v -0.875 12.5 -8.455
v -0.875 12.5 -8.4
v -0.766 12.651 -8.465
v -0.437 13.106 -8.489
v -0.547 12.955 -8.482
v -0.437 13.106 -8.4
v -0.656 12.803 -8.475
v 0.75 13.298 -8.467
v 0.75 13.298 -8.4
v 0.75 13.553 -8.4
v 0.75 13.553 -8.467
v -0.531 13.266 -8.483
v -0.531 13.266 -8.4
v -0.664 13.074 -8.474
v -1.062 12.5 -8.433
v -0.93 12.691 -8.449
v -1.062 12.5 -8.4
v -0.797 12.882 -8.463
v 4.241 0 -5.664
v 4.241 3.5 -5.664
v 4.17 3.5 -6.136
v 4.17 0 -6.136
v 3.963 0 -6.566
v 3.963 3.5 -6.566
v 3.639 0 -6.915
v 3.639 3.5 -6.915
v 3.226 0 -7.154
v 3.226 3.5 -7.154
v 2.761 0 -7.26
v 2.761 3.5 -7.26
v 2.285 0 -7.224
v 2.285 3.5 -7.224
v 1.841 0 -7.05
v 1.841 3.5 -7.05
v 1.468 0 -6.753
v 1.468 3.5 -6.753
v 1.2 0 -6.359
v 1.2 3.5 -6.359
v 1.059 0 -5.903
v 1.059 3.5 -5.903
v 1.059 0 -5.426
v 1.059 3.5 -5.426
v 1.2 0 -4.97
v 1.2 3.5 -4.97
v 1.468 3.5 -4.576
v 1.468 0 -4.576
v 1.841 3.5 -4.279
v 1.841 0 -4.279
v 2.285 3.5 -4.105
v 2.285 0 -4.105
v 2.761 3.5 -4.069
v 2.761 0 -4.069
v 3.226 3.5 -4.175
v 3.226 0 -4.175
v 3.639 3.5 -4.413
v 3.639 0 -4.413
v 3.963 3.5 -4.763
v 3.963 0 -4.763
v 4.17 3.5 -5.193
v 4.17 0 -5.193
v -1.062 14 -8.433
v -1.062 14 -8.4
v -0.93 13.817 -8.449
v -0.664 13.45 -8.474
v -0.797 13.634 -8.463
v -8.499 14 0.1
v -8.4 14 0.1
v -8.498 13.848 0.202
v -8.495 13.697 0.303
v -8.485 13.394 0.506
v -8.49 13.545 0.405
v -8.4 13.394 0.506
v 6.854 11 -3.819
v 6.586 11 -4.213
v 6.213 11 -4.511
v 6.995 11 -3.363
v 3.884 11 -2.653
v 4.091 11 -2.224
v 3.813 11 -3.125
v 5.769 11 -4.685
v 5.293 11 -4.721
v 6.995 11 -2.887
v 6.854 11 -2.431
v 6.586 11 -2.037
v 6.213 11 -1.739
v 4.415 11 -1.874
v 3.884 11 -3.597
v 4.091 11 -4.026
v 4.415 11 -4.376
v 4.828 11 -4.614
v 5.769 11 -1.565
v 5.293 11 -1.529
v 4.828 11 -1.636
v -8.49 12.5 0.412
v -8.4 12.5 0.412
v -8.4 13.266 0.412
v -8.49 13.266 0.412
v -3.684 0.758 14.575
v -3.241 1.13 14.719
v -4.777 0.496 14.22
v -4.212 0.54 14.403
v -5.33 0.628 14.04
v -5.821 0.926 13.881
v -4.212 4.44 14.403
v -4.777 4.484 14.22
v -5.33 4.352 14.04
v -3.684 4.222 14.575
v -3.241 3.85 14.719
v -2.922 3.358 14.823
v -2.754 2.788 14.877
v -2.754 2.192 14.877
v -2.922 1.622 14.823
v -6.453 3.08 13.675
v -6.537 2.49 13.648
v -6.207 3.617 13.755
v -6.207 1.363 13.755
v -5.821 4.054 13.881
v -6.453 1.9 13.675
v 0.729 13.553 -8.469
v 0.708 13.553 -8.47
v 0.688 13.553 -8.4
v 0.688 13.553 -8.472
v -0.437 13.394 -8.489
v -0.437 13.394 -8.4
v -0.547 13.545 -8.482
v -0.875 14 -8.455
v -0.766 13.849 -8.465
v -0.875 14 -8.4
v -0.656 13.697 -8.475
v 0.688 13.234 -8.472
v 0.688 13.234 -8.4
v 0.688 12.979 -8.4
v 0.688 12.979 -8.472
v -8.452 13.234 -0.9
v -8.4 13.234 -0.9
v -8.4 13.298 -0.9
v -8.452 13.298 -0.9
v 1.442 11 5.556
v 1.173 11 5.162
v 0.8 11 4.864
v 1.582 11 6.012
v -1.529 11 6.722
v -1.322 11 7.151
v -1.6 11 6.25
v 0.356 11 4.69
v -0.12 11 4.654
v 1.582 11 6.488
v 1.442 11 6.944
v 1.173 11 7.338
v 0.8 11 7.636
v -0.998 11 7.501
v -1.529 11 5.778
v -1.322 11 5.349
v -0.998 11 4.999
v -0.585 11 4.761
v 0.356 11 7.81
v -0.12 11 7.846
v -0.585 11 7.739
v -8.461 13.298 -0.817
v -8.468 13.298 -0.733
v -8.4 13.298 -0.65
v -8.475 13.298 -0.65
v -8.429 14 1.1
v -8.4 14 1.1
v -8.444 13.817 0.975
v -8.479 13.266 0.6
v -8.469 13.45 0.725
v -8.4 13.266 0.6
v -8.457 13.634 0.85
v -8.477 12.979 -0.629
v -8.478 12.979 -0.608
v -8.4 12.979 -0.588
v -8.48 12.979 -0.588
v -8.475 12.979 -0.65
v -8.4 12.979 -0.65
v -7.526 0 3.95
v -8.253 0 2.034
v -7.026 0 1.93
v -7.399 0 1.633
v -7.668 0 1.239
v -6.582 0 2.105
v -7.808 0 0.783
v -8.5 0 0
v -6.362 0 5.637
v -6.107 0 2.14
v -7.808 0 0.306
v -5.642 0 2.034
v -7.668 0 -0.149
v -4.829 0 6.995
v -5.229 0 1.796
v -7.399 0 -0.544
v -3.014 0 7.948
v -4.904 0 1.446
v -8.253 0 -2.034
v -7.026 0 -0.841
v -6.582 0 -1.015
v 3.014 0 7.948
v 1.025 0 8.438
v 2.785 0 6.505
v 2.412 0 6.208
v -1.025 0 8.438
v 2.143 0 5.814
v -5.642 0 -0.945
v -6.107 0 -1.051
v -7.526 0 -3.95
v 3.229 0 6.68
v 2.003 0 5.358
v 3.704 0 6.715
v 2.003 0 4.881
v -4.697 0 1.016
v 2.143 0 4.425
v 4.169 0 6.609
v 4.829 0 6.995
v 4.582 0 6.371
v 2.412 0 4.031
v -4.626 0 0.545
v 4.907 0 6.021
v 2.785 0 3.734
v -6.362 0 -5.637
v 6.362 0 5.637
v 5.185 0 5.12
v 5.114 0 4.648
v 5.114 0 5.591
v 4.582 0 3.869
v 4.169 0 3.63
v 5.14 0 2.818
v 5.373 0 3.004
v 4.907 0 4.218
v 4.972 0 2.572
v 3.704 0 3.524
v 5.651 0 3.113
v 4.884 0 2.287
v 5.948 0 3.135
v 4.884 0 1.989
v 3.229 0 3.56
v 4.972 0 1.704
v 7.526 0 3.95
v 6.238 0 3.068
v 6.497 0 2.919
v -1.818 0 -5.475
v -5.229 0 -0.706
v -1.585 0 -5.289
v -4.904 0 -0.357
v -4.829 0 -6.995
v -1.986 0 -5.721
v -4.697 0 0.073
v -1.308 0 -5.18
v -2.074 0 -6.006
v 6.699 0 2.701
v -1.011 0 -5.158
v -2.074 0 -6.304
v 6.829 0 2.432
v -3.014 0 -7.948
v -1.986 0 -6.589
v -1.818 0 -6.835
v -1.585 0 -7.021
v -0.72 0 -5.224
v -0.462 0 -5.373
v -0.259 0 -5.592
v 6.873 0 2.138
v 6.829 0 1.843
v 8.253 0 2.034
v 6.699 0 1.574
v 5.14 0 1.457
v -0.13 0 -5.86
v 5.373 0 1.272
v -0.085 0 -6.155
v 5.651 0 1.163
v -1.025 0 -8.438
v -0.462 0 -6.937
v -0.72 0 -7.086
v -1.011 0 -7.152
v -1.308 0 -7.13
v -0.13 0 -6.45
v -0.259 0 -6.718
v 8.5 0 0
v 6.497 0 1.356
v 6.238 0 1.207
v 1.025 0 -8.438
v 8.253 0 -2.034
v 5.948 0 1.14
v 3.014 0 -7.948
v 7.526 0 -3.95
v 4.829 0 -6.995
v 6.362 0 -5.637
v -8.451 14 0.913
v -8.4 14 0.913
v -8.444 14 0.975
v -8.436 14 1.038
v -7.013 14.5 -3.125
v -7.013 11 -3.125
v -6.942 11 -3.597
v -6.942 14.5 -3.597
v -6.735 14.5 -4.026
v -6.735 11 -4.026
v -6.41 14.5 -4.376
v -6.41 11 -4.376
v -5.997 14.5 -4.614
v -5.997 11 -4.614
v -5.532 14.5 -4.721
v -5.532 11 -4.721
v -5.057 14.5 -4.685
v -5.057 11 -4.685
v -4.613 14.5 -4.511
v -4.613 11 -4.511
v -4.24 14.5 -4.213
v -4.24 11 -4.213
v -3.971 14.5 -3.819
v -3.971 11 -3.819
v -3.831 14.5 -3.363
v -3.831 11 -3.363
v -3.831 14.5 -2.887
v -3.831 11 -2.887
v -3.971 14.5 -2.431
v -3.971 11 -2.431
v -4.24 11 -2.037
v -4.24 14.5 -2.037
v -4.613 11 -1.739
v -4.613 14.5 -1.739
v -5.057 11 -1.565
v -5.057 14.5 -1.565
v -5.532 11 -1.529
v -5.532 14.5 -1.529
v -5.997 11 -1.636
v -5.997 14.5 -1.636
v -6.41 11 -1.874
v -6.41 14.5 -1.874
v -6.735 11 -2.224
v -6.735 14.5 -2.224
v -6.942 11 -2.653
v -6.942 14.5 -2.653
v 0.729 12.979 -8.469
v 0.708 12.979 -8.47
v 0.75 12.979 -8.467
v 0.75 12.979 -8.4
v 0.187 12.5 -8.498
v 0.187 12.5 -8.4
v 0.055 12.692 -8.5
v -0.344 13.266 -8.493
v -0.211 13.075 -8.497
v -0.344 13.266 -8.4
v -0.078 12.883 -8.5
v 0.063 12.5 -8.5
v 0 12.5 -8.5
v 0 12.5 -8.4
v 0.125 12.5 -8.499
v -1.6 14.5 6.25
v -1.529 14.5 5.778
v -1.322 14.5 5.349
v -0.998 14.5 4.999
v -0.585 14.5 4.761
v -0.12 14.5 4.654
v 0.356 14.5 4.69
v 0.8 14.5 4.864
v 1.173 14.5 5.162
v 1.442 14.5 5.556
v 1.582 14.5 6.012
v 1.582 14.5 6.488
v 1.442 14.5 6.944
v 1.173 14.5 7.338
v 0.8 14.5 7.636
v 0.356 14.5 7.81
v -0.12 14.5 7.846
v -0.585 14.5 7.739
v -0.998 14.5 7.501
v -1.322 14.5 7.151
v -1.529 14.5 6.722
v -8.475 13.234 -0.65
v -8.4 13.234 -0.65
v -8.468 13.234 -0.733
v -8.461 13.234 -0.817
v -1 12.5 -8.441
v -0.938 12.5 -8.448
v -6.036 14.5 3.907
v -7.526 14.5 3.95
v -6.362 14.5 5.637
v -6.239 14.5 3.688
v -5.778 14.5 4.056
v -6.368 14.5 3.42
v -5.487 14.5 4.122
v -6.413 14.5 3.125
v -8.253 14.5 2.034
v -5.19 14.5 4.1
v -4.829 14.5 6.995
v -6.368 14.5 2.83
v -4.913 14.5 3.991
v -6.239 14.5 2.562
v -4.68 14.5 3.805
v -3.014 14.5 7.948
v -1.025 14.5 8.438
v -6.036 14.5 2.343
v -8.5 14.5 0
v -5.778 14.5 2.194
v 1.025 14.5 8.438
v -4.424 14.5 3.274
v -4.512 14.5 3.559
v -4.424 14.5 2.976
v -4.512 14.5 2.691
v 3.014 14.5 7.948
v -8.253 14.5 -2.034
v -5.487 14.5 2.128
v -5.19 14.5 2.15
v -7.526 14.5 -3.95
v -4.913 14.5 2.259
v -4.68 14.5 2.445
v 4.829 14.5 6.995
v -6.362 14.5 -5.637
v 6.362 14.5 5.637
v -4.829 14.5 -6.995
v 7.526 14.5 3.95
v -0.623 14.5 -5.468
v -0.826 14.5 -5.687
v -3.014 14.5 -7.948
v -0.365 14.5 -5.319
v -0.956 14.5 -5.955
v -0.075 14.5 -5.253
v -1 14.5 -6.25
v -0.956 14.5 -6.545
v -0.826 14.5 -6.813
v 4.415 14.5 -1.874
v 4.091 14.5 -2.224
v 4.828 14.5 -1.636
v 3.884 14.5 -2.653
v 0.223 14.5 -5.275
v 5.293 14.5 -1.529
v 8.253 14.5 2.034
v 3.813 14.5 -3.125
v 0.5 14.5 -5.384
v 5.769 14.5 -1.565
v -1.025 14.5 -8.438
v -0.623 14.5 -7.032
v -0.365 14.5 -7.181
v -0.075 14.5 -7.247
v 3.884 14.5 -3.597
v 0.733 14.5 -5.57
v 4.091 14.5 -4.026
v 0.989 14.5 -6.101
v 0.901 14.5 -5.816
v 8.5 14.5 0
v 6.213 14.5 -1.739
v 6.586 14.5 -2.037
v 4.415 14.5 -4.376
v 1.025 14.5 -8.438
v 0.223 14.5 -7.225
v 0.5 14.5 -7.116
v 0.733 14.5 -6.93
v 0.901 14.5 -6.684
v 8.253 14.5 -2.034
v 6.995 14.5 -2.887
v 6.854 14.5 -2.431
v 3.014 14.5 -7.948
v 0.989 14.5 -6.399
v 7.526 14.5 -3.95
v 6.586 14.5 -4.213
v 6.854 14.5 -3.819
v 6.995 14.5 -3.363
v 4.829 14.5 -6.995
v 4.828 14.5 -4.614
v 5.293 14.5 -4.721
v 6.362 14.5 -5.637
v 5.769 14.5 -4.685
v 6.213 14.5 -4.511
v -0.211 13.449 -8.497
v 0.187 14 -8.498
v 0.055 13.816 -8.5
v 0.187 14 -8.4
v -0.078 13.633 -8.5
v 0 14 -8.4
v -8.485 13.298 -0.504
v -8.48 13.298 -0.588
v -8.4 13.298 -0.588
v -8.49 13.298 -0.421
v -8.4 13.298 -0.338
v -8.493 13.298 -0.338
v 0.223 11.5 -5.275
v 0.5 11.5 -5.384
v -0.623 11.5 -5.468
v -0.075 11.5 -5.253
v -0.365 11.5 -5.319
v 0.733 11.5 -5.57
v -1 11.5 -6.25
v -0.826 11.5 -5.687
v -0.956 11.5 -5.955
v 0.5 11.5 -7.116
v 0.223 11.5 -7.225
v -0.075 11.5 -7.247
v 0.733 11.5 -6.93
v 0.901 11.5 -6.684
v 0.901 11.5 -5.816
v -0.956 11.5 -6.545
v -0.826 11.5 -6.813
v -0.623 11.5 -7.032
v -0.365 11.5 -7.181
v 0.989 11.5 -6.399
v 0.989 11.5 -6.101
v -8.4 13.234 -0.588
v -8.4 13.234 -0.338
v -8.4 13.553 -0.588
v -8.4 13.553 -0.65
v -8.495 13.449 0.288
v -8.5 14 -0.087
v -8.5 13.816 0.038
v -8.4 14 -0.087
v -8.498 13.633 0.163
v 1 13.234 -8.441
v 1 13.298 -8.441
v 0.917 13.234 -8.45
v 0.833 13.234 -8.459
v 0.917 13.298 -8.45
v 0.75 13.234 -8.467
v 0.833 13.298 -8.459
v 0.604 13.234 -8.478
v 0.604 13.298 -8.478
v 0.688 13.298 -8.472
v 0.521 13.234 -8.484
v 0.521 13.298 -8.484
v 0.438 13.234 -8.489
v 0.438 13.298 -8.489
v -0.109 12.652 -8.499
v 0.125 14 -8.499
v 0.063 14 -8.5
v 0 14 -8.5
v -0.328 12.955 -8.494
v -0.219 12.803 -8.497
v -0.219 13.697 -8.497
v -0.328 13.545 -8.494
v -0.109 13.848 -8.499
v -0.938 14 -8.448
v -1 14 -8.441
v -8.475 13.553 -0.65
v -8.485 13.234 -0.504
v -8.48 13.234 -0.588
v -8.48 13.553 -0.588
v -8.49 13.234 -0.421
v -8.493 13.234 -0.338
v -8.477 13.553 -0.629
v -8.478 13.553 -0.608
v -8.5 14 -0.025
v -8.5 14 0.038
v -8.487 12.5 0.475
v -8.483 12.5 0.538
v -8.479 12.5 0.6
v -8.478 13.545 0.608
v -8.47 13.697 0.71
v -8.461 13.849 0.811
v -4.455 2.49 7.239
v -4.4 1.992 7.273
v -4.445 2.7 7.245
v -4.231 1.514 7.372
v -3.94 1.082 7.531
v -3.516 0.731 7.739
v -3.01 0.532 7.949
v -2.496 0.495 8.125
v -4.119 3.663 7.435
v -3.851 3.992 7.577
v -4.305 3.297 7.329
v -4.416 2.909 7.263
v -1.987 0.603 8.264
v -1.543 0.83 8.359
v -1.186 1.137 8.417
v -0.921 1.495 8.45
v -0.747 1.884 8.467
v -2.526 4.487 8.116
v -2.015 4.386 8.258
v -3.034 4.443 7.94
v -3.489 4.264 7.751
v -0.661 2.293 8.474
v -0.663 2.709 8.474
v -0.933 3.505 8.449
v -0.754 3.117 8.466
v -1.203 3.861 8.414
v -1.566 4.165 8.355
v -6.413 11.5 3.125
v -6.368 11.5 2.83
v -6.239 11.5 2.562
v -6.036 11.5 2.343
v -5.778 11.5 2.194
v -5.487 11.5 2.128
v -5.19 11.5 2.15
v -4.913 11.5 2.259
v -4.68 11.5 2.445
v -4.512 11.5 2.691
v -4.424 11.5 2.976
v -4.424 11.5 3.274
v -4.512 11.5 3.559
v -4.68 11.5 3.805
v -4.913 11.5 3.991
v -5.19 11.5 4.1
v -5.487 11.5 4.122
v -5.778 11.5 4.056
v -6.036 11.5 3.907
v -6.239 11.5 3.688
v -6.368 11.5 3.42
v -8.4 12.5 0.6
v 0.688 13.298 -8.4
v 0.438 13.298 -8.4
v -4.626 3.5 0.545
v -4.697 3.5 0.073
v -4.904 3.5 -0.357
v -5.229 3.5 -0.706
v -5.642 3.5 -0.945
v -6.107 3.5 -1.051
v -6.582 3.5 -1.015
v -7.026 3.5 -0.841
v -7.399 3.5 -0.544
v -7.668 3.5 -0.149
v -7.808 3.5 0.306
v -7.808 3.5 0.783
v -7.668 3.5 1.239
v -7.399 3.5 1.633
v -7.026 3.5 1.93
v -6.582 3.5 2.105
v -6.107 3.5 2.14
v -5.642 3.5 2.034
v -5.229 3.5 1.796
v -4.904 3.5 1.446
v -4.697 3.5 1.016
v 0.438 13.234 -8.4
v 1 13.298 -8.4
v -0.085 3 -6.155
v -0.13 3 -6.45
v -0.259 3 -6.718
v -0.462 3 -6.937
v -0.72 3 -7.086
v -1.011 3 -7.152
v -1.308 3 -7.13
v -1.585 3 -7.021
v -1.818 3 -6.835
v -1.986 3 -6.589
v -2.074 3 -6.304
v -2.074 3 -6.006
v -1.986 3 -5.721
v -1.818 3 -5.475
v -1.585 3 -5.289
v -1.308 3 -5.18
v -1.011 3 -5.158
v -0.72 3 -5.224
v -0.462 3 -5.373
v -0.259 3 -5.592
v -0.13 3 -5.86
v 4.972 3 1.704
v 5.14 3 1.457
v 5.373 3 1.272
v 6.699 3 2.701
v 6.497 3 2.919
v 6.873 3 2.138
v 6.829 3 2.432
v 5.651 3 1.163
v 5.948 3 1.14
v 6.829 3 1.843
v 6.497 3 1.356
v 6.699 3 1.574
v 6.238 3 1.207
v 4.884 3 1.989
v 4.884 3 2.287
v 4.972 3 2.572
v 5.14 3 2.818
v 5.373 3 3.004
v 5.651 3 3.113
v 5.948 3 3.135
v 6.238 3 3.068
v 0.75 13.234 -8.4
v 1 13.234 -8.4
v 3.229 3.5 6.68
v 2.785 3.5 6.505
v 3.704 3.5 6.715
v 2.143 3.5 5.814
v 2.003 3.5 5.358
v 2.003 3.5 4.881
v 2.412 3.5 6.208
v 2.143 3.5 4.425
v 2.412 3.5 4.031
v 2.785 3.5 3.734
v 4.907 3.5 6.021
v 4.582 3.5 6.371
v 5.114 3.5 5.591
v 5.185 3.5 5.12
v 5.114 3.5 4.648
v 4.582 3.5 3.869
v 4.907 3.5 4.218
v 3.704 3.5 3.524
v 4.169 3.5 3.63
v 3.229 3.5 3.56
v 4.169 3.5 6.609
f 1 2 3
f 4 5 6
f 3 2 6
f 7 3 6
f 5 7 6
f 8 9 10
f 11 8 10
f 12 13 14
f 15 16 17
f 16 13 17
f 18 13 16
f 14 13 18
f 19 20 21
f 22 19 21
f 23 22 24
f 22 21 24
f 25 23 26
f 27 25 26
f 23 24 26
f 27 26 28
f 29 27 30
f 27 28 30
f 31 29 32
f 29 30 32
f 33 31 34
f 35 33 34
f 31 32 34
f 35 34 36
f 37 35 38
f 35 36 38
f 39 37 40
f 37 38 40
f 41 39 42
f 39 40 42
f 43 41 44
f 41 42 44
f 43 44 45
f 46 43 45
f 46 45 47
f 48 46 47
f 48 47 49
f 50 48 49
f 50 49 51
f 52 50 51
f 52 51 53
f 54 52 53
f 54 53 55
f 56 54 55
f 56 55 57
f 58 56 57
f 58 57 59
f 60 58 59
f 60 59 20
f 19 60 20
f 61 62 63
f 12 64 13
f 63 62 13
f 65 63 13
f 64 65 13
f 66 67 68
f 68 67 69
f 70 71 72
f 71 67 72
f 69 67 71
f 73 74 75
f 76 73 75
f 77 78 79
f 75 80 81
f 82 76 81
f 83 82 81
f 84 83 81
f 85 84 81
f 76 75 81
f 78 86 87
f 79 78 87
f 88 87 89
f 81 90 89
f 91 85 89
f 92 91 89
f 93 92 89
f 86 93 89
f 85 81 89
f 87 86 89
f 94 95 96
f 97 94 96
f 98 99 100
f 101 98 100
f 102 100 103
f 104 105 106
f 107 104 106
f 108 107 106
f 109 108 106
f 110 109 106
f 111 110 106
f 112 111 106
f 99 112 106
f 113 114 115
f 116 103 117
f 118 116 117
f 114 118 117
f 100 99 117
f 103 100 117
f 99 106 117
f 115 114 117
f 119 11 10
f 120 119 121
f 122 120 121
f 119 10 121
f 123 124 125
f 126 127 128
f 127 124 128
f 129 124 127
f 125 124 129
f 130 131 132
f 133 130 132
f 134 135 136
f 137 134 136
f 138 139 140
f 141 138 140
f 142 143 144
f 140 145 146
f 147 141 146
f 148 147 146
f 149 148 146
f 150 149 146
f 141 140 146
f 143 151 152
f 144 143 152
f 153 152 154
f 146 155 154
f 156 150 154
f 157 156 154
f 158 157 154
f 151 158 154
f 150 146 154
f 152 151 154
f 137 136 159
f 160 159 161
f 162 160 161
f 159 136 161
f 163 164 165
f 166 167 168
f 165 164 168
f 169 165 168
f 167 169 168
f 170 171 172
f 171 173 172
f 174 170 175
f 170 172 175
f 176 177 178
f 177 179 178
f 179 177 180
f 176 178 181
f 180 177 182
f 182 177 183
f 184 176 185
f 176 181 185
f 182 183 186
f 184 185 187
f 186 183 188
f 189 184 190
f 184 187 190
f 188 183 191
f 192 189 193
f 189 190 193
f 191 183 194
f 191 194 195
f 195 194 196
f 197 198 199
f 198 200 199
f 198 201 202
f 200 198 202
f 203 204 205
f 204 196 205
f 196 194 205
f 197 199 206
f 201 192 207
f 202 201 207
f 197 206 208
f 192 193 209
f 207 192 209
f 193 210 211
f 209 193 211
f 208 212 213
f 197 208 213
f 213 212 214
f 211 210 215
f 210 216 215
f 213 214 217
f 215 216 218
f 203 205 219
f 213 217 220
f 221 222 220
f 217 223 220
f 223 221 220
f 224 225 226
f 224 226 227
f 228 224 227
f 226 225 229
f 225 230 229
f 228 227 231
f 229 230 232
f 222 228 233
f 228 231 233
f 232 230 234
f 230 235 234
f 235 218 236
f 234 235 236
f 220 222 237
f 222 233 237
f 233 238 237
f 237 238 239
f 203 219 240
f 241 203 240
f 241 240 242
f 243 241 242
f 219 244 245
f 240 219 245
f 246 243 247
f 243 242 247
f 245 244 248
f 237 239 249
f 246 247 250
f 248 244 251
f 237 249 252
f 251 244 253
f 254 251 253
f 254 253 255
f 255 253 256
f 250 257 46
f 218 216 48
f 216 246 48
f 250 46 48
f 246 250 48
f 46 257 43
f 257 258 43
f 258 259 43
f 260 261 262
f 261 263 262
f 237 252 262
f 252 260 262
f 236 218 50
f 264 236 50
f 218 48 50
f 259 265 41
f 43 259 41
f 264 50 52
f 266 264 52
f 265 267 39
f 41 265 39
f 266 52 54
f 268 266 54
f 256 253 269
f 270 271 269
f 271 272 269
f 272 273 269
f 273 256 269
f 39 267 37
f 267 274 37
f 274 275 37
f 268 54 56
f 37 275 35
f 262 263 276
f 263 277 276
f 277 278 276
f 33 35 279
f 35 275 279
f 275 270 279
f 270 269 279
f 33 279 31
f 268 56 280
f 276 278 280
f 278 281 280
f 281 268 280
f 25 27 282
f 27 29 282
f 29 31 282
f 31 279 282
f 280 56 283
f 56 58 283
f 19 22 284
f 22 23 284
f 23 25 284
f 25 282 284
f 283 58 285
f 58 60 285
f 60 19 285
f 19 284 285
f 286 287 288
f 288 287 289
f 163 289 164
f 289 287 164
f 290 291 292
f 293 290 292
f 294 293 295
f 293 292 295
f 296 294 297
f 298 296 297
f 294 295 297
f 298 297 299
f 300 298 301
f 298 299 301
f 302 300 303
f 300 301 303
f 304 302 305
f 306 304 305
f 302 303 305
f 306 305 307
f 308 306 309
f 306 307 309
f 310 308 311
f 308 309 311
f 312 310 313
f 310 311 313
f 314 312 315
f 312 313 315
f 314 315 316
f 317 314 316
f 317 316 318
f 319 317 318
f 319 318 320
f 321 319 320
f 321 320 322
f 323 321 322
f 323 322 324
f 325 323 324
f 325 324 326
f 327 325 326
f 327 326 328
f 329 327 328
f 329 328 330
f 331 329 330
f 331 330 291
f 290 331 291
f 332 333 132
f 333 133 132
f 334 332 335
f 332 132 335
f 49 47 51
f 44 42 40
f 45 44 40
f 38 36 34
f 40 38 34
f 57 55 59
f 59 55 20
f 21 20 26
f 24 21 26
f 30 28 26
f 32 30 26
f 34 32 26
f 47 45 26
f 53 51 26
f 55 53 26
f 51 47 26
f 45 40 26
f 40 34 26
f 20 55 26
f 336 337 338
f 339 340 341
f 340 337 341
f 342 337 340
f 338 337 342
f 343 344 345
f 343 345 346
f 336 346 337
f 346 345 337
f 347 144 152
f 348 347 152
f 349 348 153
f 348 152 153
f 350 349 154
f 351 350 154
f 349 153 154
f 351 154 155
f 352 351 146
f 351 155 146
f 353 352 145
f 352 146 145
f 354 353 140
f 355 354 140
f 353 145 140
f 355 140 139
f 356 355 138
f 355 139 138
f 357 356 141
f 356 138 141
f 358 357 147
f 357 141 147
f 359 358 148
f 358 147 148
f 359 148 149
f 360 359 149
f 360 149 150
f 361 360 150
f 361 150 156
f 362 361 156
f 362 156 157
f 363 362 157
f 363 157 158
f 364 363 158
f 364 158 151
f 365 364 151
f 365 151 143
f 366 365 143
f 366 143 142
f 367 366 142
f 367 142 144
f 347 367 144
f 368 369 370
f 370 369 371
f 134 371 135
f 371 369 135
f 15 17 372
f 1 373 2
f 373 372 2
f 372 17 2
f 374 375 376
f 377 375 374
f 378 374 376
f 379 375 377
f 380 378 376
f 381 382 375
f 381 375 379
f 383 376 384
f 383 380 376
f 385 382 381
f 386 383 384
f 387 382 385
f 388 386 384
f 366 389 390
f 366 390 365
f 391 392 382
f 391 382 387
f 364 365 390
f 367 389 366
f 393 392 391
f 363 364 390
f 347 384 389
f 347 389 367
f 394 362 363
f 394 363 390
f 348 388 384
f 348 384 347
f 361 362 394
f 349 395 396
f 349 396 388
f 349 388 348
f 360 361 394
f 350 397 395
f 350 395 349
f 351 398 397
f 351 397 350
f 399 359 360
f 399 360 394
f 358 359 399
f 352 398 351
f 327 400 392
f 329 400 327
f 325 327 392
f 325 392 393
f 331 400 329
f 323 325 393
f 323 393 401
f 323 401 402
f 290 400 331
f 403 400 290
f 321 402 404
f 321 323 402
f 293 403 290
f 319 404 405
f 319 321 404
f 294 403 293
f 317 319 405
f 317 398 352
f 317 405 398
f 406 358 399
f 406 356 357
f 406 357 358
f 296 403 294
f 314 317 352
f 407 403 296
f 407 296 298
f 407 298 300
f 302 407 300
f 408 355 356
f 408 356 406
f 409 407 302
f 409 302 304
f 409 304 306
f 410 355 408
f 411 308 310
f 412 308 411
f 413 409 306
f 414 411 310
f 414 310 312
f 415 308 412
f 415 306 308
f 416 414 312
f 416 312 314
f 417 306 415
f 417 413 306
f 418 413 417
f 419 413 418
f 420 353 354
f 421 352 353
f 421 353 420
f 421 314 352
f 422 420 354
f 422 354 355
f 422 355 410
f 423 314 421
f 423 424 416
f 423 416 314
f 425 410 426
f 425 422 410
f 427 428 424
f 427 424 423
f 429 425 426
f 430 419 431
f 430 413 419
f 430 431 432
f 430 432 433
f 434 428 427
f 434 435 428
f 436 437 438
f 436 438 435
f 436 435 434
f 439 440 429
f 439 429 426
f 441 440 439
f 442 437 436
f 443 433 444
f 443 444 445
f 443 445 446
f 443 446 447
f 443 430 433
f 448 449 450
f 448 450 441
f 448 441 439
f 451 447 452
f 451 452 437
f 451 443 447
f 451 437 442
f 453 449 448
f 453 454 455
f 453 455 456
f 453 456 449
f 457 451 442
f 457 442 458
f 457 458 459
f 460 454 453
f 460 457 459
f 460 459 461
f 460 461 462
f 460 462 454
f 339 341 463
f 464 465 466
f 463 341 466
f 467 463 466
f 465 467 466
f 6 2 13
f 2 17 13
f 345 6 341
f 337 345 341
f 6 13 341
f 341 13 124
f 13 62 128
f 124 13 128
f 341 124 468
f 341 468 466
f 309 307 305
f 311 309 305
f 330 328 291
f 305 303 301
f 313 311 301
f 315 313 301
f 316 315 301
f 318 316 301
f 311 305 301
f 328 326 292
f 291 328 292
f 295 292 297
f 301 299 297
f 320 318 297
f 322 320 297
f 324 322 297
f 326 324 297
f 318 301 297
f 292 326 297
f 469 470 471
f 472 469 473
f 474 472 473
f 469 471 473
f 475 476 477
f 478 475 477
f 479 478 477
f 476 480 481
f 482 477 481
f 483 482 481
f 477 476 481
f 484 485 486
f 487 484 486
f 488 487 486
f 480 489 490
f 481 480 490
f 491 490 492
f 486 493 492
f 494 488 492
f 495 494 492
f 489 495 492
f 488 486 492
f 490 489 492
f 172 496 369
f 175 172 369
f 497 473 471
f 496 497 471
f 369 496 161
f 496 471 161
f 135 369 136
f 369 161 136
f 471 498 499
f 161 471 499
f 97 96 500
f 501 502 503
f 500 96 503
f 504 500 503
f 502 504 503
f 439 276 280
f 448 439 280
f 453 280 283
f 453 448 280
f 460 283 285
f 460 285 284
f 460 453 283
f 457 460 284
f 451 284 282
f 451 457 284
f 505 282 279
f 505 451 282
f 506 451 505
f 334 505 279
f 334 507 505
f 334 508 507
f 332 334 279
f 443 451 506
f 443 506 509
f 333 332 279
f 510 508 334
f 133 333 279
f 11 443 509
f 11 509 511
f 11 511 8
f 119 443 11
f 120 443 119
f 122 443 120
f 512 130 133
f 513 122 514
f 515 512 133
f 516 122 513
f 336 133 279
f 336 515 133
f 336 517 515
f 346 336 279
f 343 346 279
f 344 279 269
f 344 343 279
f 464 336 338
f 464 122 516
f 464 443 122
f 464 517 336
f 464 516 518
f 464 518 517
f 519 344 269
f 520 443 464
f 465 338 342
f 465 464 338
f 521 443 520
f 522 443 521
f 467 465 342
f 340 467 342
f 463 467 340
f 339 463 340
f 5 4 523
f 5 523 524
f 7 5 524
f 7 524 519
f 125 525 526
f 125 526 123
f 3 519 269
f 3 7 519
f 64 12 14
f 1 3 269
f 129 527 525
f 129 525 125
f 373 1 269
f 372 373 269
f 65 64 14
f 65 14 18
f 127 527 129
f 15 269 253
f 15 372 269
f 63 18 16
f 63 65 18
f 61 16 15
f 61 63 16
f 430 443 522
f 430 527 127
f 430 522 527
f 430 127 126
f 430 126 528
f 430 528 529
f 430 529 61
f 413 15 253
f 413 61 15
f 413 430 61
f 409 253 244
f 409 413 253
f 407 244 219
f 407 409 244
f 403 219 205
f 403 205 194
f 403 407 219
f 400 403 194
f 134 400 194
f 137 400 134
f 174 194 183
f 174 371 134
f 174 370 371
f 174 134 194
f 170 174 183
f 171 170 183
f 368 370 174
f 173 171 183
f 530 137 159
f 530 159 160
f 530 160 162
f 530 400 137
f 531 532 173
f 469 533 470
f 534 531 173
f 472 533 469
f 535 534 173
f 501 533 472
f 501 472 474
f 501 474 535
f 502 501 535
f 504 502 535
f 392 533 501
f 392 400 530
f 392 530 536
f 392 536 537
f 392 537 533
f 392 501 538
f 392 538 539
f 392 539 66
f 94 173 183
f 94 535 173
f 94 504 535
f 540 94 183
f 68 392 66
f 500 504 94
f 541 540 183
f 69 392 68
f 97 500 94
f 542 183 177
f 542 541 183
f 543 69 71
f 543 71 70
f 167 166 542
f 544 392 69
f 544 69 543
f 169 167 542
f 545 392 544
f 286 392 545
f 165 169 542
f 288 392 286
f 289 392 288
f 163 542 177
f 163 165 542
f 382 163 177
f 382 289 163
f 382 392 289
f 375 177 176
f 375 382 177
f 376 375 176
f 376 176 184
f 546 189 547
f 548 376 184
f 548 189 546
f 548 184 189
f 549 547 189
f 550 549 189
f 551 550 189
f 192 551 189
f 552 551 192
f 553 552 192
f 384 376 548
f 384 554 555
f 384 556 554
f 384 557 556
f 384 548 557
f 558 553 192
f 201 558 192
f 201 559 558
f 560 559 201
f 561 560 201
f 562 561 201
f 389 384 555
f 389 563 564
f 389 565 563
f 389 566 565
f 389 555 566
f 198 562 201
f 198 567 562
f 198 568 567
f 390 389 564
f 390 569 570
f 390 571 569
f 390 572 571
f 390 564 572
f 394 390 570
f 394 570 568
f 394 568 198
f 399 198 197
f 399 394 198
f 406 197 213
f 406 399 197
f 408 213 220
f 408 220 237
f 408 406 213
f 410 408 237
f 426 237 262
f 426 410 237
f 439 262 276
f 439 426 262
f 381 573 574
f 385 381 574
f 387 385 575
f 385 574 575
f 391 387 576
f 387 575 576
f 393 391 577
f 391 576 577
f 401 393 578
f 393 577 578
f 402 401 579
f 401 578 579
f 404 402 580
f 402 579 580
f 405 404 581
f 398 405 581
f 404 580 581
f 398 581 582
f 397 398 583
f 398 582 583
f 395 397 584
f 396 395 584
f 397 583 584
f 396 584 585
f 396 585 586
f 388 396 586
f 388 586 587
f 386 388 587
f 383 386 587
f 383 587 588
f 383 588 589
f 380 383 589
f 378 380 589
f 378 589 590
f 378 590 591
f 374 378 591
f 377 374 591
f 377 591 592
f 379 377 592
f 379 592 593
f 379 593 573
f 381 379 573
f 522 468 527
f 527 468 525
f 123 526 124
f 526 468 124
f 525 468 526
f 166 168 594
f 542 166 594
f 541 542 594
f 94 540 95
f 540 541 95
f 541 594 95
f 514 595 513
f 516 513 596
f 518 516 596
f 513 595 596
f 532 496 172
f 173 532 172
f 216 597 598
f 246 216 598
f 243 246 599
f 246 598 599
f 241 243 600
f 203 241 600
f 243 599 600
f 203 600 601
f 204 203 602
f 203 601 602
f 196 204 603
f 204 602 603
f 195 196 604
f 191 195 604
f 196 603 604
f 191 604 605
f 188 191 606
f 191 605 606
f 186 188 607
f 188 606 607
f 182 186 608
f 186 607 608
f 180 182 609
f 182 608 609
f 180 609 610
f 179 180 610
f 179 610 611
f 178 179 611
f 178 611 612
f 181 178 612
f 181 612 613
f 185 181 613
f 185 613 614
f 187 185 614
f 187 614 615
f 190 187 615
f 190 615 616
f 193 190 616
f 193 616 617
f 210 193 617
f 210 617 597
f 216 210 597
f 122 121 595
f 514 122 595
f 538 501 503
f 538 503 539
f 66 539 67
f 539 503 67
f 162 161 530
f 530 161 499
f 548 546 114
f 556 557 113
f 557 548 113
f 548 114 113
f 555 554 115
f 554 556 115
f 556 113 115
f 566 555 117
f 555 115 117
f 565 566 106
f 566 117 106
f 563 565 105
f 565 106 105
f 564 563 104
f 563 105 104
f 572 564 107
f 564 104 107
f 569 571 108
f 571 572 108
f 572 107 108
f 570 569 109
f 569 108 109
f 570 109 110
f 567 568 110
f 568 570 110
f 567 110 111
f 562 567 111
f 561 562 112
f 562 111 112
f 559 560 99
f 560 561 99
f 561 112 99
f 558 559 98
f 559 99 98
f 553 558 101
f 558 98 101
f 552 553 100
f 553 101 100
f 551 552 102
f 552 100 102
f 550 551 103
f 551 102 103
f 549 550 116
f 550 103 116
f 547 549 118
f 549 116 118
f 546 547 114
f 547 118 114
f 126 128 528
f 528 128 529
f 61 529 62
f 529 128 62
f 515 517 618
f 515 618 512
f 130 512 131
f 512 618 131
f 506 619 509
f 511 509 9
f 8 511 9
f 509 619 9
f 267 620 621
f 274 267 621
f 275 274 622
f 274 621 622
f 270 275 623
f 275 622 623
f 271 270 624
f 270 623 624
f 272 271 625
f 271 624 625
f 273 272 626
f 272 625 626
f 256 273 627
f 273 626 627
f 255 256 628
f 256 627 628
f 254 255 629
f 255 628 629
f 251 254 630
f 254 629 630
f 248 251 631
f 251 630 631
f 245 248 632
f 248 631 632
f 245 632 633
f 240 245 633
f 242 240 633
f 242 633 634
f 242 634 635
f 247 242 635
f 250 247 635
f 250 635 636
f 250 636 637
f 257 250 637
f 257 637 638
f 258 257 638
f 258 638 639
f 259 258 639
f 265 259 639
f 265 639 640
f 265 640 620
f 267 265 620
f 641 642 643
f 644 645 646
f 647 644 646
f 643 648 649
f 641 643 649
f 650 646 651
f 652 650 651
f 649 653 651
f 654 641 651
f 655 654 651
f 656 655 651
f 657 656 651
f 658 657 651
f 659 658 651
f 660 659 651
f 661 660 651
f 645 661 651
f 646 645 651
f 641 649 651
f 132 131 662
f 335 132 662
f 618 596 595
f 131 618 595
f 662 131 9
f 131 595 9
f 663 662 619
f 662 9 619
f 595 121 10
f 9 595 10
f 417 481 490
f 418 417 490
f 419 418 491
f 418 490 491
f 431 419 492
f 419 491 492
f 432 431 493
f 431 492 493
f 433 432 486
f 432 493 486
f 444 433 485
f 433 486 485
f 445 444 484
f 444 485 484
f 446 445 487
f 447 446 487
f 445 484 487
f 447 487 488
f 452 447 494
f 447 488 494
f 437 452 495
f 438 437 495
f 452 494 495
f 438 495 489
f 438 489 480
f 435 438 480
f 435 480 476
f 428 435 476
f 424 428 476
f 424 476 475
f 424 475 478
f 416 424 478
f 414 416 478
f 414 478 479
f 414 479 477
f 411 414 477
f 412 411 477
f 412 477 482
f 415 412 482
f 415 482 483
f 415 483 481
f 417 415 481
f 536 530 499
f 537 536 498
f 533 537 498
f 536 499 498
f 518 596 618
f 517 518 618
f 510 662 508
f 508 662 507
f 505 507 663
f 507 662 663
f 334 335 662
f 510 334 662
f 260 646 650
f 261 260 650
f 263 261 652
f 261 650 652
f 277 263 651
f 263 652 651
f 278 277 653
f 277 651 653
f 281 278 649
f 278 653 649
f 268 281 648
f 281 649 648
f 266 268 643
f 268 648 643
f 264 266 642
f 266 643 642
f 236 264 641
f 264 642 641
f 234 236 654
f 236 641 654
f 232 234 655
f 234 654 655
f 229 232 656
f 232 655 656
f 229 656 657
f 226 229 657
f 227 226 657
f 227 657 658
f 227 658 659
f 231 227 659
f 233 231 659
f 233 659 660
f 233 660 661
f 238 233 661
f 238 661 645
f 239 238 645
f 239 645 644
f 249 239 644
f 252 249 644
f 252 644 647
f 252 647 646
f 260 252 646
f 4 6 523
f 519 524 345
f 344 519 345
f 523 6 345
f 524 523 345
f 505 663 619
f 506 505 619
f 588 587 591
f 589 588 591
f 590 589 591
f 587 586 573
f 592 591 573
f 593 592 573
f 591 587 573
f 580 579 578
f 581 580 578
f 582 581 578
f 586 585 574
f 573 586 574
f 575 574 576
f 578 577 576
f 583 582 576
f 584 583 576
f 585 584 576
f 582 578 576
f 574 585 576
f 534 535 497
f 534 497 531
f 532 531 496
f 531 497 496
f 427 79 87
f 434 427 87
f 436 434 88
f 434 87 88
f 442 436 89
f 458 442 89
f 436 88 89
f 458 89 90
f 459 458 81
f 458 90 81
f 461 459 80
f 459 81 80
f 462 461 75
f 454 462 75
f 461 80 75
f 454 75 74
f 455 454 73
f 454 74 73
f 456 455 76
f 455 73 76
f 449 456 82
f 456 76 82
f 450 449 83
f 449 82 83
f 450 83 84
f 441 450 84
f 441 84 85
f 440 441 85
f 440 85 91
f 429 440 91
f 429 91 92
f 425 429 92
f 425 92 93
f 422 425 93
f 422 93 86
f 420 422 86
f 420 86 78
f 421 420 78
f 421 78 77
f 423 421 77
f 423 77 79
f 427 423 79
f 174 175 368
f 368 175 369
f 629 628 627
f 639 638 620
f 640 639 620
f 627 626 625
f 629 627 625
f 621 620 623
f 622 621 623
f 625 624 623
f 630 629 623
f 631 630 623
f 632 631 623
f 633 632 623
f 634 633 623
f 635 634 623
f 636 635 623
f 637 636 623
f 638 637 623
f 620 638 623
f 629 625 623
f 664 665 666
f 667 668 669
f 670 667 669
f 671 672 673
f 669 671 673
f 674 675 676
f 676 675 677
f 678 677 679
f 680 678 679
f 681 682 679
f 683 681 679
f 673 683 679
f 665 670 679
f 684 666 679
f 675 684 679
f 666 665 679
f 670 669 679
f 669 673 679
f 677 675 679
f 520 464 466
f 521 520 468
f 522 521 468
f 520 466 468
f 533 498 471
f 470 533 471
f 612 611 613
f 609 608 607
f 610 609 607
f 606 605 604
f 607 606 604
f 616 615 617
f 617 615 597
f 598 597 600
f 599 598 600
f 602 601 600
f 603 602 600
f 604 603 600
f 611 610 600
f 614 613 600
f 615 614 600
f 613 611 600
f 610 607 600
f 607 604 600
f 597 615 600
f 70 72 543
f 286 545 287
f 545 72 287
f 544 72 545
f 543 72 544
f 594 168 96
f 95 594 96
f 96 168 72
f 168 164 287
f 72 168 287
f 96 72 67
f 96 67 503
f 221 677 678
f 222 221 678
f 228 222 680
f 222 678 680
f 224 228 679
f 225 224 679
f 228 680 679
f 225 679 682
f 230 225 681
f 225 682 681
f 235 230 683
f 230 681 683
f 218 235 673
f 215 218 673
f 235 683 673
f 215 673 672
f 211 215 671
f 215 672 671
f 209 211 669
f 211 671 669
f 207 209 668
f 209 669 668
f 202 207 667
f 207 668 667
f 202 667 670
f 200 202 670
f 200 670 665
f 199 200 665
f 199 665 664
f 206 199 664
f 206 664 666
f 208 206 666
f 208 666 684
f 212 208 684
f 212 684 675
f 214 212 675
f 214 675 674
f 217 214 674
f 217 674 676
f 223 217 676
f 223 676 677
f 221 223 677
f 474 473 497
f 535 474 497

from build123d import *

# Parameters (mm, degrees)
SKETCH1_W                    = 8.5
SKETCH1_H                    = 14.5
CUT_EXTRUDE1_REACH           = 2.1
CUT_EXTRUDE2_REACH           = 2.1
CUT_EXTRUDE3_REACH           = 2.1
CUT_EXTRUDE4_REACH           = 2.1
F_2_0_2_DIAMETER_HOLE1_D     = 2
F_2_0_2_DIAMETER_HOLE1_DEPTH = 3
F_2_0_2_DIAMETER_HOLE2_D     = 3.2
F_2_0_2_DIAMETER_HOLE2_DEPTH = 3.5
F_2_0_2_DIAMETER_HOLE3_D     = 2
F_2_0_2_DIAMETER_HOLE3_DEPTH = 3
F_2_0_2_DIAMETER_HOLE4_D     = 3.2
F_2_0_2_DIAMETER_HOLE4_DEPTH = 3.5


with BuildPart() as part:
    # Sketch1 → Revolve1 (revolve)
    with BuildSketch(Plane(origin=(0, 0, 0), x_dir=(-1, 0, 0), z_dir=(0, 0, -1))):
        with Locations((-4.25, 7.25)):
            Rectangle(SKETCH1_W, SKETCH1_H)
    revolve(axis=Axis((0, 0, 0), (0, 1, 0)))

    # Sketch2 → Cut-Extrude1 (cut, up to next)
    with BuildSketch(Plane(origin=(-8.4, 0, 0), x_dir=(0, 0, -1), z_dir=(1, 0, 0)), mode=Mode.PRIVATE) as cut_extrude1_sk1:
        Polygon((0.9, 13.234042555), (0.9, 13.297872335), (0.649999993, 13.297872335), (0.649999993, 13.553191453), (0.587500007, 13.553191453), (0.587500007, 13.297872335), (0.3375, 13.297872335), (0.3375, 13.234042555), (0.587500007, 13.234042555), (0.587500007, 12.978723392), (0.649999993, 12.978723392), (0.649999993, 13.234042555), align=None)
    cut_extrude1_tool1 = extrude(cut_extrude1_sk1.sketch, amount=-CUT_EXTRUDE1_REACH, mode=Mode.PRIVATE) & part.part
    add(cut_extrude1_tool1.solids().sort_by_distance((-8.4, 13.265957, -0.61875))[0], mode=Mode.SUBTRACT)

    # Sketch3 → Cut-Extrude2 (cut, up to next)
    with BuildSketch(Plane.XY.offset(-8.4), mode=Mode.PRIVATE) as cut_extrude2_sk1:
        Polygon((1, 13.234042555), (1, 13.297872335), (0.749999993, 13.297872335), (0.749999993, 13.553191453), (0.687500007, 13.553191453), (0.687500007, 13.297872335), (0.4375, 13.297872335), (0.4375, 13.234042555), (0.687500007, 13.234042555), (0.687500007, 12.978723392), (0.749999993, 12.978723392), (0.749999993, 13.234042555), align=None)
    cut_extrude2_tool1 = extrude(cut_extrude2_sk1.sketch, amount=-CUT_EXTRUDE2_REACH, mode=Mode.PRIVATE) & part.part
    add(cut_extrude2_tool1.solids().sort_by_distance((0.71875, 13.265957, -8.4))[0], mode=Mode.SUBTRACT)

    # Sketch4 → Cut-Extrude3 (cut, up to next)
    with BuildSketch(Plane.XY.offset(-8.4), mode=Mode.PRIVATE) as cut_extrude3_sk1:
        Polygon((-0.875, 12.5), (-0.43749997, 13.106382996), (-3e-08, 12.5), (0.18749997, 12.5), (-0.34374997, 13.265957445), (0.18749997, 14), (-3e-08, 14), (-0.43749997, 13.393617004), (-0.875, 14), (-1.0625, 14), (-0.53125006, 13.265957445), (-1.0625, 12.5), align=None)
    cut_extrude3_tool1 = extrude(cut_extrude3_sk1.sketch, amount=-CUT_EXTRUDE3_REACH, mode=Mode.PRIVATE) & part.part
    add(cut_extrude3_tool1.solids().sort_by_distance((-0.4375, 13.242259, -8.4))[0], mode=Mode.SUBTRACT)

    # Sketch5 → Cut-Extrude4 (cut, up to next)
    with BuildSketch(Plane(origin=(-8.4, 0, 0), x_dir=(0, 0, -1), z_dir=(1, 0, 0)), mode=Mode.PRIVATE) as cut_extrude4_sk1:
        Polygon((-1.10000006, 14), (-0.6, 13.265957445), (-0.6, 12.5), (-0.4125, 12.5), (-0.4125, 13.265957445), (0.08749997, 14), (-0.10000003, 14), (-0.50625, 13.393617004), (-0.91250006, 14), align=None)
    cut_extrude4_tool1 = extrude(cut_extrude4_sk1.sketch, amount=-CUT_EXTRUDE4_REACH, mode=Mode.PRIVATE) & part.part
    add(cut_extrude4_tool1.solids().sort_by_distance((-8.4, 13.37564, 0.50625))[0], mode=Mode.SUBTRACT)

    # Sketch6 → Revolve2 (revolve)
    with BuildSketch(Plane(origin=(0, 2.49, 0), x_dir=(1, 0, 0), z_dir=(0, 1, 0))):
        Polygon((-6.537367948, -13.647813756), (-4.635254916, -14.265847744), (-2.552899345, -7.857016287), (-4.455012378, -7.238982298), align=None)
    revolve(axis=Axis((-4.635254916, 2.49, 14.265847744), (0.309016994, 0, -0.951056516)))

    # Ø2.0 (2) Diameter Hole1
    with Locations(Plane(origin=(0, 0, 0), x_dir=(-1, 0, 0), z_dir=(0, -1, 0))):
        with Locations((1.08530111, 6.155048456), (-5.87307888, -2.137625896)):
            Hole(F_2_0_2_DIAMETER_HOLE1_D / 2, depth=F_2_0_2_DIAMETER_HOLE1_DEPTH)

    # Ø2.0 (2) Diameter Hole2
    with Locations(Plane(origin=(0, 0, 0), x_dir=(-1, 0, 0), z_dir=(0, -1, 0))):
        with Locations((6.226216863, -0.544723392), (-3.584852727, -5.119700277), (-2.641364136, 5.664423669)):
            Hole(F_2_0_2_DIAMETER_HOLE2_D / 2, depth=F_2_0_2_DIAMETER_HOLE2_DEPTH)

    # Ø2.0 (2) Diameter Hole3
    with Locations(Plane(origin=(0, 14.5, 0), x_dir=(1, 0, 0), z_dir=(0, 1, 0))):
        with Locations((0, 6.25), (-5.412658774, -3.125)):
            Hole(F_2_0_2_DIAMETER_HOLE3_D / 2, depth=F_2_0_2_DIAMETER_HOLE3_DEPTH)

    # Ø2.0 (2) Diameter Hole4
    with Locations(Plane(origin=(0, 14.5, 0), x_dir=(1, 0, 0), z_dir=(0, 1, 0))):
        with Locations((0, -6.25), (5.412658774, 3.125), (-5.412658774, 3.125)):
            Hole(F_2_0_2_DIAMETER_HOLE4_D / 2, depth=F_2_0_2_DIAMETER_HOLE4_DEPTH)


solid = part.part
